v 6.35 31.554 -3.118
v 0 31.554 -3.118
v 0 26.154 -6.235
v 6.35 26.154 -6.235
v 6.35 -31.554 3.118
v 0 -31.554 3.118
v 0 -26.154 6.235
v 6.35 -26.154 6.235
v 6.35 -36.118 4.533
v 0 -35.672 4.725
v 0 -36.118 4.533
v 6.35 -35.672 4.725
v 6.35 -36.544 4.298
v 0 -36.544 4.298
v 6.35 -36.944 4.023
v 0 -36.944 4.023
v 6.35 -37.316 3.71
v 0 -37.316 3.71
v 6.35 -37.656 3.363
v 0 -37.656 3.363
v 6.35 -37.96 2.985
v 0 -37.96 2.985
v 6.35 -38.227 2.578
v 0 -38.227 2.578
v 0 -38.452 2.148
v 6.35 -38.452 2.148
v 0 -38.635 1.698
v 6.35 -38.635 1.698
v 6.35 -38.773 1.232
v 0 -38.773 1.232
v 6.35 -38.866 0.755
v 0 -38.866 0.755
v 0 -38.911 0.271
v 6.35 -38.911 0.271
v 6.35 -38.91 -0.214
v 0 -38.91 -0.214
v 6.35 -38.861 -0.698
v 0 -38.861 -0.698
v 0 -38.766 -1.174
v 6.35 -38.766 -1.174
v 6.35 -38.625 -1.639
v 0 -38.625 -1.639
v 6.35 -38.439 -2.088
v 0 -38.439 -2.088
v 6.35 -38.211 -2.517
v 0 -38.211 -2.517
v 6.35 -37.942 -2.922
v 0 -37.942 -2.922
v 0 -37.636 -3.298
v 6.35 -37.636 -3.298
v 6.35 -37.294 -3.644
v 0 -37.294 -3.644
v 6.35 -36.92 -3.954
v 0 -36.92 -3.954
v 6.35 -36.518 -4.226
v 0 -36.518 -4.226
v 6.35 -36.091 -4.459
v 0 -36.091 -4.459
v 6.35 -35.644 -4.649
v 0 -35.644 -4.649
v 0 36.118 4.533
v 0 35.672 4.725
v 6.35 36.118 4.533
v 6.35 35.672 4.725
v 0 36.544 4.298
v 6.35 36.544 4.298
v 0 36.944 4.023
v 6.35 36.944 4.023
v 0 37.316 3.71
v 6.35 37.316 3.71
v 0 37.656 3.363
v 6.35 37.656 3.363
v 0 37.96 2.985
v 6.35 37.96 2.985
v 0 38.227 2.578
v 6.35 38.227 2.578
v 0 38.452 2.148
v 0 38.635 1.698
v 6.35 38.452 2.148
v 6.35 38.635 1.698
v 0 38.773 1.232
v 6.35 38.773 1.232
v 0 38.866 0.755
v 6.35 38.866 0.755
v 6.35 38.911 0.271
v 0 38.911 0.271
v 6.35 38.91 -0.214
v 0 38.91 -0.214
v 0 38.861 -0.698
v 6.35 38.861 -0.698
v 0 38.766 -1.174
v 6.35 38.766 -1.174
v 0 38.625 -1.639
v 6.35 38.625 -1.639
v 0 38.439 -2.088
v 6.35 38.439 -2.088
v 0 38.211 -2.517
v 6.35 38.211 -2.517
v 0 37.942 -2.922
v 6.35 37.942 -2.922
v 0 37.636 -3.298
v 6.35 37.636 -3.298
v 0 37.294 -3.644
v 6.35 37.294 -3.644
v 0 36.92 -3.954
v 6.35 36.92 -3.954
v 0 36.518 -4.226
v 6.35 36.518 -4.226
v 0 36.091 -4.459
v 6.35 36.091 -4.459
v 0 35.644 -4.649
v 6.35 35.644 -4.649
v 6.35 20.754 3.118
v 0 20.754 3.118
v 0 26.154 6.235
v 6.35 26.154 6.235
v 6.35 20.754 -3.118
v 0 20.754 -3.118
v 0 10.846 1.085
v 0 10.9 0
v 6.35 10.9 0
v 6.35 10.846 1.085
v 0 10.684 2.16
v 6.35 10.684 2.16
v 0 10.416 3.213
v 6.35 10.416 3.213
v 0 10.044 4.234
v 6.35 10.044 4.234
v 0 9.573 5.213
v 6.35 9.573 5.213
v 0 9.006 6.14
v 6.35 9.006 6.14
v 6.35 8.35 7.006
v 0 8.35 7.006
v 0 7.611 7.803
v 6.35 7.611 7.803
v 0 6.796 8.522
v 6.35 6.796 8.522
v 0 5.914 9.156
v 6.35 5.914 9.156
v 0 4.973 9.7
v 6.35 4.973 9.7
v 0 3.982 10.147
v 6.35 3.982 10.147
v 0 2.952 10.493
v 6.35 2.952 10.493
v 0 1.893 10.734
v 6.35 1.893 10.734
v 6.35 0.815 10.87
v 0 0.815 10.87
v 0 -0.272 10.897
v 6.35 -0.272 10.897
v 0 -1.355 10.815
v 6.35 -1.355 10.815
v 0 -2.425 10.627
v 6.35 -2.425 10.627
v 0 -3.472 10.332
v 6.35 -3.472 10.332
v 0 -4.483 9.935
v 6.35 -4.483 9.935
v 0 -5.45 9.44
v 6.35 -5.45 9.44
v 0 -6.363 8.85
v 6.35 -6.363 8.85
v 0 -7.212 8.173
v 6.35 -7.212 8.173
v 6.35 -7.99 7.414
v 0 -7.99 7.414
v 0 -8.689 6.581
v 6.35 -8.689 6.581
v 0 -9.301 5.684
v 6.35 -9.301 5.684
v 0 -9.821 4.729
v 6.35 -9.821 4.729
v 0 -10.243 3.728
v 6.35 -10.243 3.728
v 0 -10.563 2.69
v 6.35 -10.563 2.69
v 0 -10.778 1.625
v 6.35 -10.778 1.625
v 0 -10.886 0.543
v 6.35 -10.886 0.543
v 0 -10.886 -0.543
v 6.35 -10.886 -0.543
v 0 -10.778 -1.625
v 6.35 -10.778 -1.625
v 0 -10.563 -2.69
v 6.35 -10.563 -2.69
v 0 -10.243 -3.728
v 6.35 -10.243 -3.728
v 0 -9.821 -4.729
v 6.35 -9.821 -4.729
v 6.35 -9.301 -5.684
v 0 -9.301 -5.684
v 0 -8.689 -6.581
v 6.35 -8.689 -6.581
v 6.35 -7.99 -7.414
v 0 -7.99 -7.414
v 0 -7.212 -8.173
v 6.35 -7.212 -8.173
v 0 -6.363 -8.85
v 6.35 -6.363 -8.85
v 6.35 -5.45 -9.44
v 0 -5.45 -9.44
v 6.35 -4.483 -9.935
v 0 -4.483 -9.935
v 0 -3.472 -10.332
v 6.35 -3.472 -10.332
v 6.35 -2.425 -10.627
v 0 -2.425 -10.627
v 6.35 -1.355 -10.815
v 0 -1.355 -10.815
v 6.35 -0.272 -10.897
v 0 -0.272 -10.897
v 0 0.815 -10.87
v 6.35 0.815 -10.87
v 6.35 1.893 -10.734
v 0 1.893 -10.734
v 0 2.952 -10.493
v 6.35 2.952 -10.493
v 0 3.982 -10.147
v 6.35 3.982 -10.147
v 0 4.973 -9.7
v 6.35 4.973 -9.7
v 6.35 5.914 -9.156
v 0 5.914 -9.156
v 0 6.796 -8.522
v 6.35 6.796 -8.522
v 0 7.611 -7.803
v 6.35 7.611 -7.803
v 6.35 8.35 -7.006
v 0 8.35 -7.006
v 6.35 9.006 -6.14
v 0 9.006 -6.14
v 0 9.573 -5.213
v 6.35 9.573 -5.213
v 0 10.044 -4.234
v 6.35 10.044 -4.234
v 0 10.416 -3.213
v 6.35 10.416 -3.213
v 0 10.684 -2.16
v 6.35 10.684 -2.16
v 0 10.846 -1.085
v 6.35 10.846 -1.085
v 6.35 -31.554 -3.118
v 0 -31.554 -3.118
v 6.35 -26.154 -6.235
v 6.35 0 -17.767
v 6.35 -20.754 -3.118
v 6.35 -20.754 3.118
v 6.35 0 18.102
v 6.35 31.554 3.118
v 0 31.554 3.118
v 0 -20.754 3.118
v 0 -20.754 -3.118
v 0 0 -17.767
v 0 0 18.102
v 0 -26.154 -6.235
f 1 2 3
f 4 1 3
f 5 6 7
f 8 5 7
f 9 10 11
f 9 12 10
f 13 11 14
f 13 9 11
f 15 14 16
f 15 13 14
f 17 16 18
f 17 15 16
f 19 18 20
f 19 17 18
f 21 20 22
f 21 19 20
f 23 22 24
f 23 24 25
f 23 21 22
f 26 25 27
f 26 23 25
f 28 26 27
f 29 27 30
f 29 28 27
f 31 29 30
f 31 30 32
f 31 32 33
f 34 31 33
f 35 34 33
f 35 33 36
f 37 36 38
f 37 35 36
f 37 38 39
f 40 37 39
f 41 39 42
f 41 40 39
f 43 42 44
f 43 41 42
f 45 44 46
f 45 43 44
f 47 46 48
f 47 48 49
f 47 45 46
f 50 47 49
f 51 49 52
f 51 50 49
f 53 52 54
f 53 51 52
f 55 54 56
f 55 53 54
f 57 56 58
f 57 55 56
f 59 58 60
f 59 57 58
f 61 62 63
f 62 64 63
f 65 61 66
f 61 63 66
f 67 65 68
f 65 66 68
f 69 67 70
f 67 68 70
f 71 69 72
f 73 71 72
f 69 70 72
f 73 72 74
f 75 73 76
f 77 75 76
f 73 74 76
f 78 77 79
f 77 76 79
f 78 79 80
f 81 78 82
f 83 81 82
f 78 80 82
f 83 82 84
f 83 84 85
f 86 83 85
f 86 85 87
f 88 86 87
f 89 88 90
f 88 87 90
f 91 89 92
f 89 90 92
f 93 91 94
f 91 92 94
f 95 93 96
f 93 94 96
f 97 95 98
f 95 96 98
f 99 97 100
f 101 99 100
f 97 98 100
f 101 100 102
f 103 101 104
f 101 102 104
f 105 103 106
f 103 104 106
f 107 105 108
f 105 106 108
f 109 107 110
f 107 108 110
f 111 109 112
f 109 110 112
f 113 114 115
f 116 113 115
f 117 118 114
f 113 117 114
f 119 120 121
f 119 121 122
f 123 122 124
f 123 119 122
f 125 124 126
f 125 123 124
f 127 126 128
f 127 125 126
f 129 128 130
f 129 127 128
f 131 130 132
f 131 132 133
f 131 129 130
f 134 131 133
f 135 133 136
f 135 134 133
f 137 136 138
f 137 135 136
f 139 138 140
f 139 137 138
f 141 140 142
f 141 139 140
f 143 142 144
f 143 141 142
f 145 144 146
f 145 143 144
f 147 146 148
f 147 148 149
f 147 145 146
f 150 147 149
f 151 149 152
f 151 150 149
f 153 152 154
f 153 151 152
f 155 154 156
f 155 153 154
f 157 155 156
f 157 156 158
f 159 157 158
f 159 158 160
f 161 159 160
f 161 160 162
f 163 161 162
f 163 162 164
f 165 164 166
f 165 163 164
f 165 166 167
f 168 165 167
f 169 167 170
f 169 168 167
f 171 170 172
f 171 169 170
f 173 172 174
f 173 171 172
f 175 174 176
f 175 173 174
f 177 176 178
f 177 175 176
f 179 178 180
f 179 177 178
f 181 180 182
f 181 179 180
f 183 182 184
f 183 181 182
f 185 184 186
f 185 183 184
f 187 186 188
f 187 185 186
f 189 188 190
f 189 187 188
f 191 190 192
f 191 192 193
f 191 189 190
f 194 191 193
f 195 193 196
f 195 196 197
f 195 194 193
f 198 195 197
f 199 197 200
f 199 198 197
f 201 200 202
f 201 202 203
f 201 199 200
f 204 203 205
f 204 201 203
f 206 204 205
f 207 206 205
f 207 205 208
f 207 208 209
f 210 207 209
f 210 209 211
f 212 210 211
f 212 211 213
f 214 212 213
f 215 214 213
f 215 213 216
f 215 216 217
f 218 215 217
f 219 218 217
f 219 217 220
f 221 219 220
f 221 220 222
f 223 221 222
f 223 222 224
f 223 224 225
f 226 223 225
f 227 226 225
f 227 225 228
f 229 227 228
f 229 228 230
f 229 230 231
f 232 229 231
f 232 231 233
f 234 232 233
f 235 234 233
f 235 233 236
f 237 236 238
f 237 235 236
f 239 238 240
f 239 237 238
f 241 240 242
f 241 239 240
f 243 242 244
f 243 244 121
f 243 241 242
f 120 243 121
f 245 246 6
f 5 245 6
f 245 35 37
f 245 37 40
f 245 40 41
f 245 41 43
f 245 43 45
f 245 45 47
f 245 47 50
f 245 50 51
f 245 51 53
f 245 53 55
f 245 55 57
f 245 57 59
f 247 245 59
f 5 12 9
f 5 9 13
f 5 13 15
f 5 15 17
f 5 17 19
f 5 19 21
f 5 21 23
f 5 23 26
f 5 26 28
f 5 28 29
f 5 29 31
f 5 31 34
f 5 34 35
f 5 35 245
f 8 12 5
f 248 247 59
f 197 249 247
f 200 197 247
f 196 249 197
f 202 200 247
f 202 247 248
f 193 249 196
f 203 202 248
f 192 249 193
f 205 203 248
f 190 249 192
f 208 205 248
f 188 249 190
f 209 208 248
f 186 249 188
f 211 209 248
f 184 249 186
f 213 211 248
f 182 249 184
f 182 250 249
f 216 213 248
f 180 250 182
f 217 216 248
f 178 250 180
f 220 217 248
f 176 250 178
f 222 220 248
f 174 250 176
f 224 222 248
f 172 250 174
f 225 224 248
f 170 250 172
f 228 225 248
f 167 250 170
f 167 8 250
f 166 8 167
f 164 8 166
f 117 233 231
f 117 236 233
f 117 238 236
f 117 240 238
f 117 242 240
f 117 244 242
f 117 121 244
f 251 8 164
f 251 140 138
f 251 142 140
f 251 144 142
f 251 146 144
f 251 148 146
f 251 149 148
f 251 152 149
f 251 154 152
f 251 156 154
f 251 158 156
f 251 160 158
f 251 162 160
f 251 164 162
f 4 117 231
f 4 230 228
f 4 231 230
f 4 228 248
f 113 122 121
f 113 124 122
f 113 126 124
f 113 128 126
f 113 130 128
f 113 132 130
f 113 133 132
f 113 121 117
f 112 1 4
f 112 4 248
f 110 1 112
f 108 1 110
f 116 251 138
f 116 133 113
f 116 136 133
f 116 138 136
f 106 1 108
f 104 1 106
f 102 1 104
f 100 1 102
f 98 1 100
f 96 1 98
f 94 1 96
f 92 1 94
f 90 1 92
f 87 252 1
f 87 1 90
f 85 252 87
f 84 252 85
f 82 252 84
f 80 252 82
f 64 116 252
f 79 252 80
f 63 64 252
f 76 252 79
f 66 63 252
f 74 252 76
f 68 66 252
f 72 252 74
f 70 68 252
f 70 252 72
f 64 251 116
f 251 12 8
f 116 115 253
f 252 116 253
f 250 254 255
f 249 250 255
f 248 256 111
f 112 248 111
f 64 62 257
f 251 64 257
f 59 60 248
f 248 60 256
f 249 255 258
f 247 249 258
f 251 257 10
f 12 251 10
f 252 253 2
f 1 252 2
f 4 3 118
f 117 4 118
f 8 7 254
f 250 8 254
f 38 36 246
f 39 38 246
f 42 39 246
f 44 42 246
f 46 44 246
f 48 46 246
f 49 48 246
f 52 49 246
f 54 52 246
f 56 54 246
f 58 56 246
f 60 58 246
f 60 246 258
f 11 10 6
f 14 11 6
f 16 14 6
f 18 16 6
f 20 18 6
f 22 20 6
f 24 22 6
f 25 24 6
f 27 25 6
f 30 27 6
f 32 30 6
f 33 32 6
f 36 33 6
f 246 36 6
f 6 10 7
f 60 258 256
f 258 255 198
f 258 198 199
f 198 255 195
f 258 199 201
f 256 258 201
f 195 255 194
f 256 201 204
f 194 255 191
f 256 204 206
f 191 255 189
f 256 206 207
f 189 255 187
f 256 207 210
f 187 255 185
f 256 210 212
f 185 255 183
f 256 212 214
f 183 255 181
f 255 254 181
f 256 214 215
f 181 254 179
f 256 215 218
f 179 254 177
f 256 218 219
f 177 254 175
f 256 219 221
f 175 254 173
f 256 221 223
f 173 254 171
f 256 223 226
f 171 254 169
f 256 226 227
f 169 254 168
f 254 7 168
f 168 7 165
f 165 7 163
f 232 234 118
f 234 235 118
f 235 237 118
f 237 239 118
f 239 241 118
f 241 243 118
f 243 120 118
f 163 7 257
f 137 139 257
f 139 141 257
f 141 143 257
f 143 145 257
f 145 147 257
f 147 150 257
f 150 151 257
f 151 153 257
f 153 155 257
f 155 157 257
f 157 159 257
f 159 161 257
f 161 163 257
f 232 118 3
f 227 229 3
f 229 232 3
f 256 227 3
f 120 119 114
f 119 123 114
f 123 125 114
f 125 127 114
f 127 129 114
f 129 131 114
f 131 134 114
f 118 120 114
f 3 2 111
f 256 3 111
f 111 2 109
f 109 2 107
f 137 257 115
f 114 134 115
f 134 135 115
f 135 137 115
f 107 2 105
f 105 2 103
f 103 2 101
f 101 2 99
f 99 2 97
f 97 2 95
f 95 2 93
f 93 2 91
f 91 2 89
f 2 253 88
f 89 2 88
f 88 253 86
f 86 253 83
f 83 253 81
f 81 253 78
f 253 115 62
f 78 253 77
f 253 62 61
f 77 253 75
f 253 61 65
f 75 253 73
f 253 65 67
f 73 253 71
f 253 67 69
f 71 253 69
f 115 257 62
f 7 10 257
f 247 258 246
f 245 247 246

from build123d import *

# Parameters (mm, degrees)
F0_R     = 10.9
F1_DEPTH = 6.35
F2_R     = 5


with BuildPart() as f1:
    # F0 (on Right) → F1 (new body)
    with BuildSketch(Plane.YZ):
        Polygon((48.273511, 0), (0, 18.102249), (-48.273511, 0), (0, -17.76745), align=None)
        Polygon((-20.75447, -3.117691), (-26.15447, -6.235383), (-31.55447, -3.117691), (-31.55447, 3.117691), (-26.15447, 6.235383), (-20.75447, 3.117691), align=None, mode=Mode.SUBTRACT)
        Circle(F0_R, mode=Mode.SUBTRACT)
        Polygon((26.15447, -6.235383), (20.75447, -3.117691), (20.75447, 3.117691), (26.15447, 6.235383), (31.55447, 3.117691), (31.55447, -3.117691), align=None, mode=Mode.SUBTRACT)
    extrude(amount=F1_DEPTH)

    # F2
    f2_edges = [f1.edges().sort_by_distance(p)[0] for p in [
        (3.175, -48.273511, 0),
        (3.175, 48.273511, 0),
    ]]
    fillet(f2_edges, radius=F2_R)


solid = f1.part
